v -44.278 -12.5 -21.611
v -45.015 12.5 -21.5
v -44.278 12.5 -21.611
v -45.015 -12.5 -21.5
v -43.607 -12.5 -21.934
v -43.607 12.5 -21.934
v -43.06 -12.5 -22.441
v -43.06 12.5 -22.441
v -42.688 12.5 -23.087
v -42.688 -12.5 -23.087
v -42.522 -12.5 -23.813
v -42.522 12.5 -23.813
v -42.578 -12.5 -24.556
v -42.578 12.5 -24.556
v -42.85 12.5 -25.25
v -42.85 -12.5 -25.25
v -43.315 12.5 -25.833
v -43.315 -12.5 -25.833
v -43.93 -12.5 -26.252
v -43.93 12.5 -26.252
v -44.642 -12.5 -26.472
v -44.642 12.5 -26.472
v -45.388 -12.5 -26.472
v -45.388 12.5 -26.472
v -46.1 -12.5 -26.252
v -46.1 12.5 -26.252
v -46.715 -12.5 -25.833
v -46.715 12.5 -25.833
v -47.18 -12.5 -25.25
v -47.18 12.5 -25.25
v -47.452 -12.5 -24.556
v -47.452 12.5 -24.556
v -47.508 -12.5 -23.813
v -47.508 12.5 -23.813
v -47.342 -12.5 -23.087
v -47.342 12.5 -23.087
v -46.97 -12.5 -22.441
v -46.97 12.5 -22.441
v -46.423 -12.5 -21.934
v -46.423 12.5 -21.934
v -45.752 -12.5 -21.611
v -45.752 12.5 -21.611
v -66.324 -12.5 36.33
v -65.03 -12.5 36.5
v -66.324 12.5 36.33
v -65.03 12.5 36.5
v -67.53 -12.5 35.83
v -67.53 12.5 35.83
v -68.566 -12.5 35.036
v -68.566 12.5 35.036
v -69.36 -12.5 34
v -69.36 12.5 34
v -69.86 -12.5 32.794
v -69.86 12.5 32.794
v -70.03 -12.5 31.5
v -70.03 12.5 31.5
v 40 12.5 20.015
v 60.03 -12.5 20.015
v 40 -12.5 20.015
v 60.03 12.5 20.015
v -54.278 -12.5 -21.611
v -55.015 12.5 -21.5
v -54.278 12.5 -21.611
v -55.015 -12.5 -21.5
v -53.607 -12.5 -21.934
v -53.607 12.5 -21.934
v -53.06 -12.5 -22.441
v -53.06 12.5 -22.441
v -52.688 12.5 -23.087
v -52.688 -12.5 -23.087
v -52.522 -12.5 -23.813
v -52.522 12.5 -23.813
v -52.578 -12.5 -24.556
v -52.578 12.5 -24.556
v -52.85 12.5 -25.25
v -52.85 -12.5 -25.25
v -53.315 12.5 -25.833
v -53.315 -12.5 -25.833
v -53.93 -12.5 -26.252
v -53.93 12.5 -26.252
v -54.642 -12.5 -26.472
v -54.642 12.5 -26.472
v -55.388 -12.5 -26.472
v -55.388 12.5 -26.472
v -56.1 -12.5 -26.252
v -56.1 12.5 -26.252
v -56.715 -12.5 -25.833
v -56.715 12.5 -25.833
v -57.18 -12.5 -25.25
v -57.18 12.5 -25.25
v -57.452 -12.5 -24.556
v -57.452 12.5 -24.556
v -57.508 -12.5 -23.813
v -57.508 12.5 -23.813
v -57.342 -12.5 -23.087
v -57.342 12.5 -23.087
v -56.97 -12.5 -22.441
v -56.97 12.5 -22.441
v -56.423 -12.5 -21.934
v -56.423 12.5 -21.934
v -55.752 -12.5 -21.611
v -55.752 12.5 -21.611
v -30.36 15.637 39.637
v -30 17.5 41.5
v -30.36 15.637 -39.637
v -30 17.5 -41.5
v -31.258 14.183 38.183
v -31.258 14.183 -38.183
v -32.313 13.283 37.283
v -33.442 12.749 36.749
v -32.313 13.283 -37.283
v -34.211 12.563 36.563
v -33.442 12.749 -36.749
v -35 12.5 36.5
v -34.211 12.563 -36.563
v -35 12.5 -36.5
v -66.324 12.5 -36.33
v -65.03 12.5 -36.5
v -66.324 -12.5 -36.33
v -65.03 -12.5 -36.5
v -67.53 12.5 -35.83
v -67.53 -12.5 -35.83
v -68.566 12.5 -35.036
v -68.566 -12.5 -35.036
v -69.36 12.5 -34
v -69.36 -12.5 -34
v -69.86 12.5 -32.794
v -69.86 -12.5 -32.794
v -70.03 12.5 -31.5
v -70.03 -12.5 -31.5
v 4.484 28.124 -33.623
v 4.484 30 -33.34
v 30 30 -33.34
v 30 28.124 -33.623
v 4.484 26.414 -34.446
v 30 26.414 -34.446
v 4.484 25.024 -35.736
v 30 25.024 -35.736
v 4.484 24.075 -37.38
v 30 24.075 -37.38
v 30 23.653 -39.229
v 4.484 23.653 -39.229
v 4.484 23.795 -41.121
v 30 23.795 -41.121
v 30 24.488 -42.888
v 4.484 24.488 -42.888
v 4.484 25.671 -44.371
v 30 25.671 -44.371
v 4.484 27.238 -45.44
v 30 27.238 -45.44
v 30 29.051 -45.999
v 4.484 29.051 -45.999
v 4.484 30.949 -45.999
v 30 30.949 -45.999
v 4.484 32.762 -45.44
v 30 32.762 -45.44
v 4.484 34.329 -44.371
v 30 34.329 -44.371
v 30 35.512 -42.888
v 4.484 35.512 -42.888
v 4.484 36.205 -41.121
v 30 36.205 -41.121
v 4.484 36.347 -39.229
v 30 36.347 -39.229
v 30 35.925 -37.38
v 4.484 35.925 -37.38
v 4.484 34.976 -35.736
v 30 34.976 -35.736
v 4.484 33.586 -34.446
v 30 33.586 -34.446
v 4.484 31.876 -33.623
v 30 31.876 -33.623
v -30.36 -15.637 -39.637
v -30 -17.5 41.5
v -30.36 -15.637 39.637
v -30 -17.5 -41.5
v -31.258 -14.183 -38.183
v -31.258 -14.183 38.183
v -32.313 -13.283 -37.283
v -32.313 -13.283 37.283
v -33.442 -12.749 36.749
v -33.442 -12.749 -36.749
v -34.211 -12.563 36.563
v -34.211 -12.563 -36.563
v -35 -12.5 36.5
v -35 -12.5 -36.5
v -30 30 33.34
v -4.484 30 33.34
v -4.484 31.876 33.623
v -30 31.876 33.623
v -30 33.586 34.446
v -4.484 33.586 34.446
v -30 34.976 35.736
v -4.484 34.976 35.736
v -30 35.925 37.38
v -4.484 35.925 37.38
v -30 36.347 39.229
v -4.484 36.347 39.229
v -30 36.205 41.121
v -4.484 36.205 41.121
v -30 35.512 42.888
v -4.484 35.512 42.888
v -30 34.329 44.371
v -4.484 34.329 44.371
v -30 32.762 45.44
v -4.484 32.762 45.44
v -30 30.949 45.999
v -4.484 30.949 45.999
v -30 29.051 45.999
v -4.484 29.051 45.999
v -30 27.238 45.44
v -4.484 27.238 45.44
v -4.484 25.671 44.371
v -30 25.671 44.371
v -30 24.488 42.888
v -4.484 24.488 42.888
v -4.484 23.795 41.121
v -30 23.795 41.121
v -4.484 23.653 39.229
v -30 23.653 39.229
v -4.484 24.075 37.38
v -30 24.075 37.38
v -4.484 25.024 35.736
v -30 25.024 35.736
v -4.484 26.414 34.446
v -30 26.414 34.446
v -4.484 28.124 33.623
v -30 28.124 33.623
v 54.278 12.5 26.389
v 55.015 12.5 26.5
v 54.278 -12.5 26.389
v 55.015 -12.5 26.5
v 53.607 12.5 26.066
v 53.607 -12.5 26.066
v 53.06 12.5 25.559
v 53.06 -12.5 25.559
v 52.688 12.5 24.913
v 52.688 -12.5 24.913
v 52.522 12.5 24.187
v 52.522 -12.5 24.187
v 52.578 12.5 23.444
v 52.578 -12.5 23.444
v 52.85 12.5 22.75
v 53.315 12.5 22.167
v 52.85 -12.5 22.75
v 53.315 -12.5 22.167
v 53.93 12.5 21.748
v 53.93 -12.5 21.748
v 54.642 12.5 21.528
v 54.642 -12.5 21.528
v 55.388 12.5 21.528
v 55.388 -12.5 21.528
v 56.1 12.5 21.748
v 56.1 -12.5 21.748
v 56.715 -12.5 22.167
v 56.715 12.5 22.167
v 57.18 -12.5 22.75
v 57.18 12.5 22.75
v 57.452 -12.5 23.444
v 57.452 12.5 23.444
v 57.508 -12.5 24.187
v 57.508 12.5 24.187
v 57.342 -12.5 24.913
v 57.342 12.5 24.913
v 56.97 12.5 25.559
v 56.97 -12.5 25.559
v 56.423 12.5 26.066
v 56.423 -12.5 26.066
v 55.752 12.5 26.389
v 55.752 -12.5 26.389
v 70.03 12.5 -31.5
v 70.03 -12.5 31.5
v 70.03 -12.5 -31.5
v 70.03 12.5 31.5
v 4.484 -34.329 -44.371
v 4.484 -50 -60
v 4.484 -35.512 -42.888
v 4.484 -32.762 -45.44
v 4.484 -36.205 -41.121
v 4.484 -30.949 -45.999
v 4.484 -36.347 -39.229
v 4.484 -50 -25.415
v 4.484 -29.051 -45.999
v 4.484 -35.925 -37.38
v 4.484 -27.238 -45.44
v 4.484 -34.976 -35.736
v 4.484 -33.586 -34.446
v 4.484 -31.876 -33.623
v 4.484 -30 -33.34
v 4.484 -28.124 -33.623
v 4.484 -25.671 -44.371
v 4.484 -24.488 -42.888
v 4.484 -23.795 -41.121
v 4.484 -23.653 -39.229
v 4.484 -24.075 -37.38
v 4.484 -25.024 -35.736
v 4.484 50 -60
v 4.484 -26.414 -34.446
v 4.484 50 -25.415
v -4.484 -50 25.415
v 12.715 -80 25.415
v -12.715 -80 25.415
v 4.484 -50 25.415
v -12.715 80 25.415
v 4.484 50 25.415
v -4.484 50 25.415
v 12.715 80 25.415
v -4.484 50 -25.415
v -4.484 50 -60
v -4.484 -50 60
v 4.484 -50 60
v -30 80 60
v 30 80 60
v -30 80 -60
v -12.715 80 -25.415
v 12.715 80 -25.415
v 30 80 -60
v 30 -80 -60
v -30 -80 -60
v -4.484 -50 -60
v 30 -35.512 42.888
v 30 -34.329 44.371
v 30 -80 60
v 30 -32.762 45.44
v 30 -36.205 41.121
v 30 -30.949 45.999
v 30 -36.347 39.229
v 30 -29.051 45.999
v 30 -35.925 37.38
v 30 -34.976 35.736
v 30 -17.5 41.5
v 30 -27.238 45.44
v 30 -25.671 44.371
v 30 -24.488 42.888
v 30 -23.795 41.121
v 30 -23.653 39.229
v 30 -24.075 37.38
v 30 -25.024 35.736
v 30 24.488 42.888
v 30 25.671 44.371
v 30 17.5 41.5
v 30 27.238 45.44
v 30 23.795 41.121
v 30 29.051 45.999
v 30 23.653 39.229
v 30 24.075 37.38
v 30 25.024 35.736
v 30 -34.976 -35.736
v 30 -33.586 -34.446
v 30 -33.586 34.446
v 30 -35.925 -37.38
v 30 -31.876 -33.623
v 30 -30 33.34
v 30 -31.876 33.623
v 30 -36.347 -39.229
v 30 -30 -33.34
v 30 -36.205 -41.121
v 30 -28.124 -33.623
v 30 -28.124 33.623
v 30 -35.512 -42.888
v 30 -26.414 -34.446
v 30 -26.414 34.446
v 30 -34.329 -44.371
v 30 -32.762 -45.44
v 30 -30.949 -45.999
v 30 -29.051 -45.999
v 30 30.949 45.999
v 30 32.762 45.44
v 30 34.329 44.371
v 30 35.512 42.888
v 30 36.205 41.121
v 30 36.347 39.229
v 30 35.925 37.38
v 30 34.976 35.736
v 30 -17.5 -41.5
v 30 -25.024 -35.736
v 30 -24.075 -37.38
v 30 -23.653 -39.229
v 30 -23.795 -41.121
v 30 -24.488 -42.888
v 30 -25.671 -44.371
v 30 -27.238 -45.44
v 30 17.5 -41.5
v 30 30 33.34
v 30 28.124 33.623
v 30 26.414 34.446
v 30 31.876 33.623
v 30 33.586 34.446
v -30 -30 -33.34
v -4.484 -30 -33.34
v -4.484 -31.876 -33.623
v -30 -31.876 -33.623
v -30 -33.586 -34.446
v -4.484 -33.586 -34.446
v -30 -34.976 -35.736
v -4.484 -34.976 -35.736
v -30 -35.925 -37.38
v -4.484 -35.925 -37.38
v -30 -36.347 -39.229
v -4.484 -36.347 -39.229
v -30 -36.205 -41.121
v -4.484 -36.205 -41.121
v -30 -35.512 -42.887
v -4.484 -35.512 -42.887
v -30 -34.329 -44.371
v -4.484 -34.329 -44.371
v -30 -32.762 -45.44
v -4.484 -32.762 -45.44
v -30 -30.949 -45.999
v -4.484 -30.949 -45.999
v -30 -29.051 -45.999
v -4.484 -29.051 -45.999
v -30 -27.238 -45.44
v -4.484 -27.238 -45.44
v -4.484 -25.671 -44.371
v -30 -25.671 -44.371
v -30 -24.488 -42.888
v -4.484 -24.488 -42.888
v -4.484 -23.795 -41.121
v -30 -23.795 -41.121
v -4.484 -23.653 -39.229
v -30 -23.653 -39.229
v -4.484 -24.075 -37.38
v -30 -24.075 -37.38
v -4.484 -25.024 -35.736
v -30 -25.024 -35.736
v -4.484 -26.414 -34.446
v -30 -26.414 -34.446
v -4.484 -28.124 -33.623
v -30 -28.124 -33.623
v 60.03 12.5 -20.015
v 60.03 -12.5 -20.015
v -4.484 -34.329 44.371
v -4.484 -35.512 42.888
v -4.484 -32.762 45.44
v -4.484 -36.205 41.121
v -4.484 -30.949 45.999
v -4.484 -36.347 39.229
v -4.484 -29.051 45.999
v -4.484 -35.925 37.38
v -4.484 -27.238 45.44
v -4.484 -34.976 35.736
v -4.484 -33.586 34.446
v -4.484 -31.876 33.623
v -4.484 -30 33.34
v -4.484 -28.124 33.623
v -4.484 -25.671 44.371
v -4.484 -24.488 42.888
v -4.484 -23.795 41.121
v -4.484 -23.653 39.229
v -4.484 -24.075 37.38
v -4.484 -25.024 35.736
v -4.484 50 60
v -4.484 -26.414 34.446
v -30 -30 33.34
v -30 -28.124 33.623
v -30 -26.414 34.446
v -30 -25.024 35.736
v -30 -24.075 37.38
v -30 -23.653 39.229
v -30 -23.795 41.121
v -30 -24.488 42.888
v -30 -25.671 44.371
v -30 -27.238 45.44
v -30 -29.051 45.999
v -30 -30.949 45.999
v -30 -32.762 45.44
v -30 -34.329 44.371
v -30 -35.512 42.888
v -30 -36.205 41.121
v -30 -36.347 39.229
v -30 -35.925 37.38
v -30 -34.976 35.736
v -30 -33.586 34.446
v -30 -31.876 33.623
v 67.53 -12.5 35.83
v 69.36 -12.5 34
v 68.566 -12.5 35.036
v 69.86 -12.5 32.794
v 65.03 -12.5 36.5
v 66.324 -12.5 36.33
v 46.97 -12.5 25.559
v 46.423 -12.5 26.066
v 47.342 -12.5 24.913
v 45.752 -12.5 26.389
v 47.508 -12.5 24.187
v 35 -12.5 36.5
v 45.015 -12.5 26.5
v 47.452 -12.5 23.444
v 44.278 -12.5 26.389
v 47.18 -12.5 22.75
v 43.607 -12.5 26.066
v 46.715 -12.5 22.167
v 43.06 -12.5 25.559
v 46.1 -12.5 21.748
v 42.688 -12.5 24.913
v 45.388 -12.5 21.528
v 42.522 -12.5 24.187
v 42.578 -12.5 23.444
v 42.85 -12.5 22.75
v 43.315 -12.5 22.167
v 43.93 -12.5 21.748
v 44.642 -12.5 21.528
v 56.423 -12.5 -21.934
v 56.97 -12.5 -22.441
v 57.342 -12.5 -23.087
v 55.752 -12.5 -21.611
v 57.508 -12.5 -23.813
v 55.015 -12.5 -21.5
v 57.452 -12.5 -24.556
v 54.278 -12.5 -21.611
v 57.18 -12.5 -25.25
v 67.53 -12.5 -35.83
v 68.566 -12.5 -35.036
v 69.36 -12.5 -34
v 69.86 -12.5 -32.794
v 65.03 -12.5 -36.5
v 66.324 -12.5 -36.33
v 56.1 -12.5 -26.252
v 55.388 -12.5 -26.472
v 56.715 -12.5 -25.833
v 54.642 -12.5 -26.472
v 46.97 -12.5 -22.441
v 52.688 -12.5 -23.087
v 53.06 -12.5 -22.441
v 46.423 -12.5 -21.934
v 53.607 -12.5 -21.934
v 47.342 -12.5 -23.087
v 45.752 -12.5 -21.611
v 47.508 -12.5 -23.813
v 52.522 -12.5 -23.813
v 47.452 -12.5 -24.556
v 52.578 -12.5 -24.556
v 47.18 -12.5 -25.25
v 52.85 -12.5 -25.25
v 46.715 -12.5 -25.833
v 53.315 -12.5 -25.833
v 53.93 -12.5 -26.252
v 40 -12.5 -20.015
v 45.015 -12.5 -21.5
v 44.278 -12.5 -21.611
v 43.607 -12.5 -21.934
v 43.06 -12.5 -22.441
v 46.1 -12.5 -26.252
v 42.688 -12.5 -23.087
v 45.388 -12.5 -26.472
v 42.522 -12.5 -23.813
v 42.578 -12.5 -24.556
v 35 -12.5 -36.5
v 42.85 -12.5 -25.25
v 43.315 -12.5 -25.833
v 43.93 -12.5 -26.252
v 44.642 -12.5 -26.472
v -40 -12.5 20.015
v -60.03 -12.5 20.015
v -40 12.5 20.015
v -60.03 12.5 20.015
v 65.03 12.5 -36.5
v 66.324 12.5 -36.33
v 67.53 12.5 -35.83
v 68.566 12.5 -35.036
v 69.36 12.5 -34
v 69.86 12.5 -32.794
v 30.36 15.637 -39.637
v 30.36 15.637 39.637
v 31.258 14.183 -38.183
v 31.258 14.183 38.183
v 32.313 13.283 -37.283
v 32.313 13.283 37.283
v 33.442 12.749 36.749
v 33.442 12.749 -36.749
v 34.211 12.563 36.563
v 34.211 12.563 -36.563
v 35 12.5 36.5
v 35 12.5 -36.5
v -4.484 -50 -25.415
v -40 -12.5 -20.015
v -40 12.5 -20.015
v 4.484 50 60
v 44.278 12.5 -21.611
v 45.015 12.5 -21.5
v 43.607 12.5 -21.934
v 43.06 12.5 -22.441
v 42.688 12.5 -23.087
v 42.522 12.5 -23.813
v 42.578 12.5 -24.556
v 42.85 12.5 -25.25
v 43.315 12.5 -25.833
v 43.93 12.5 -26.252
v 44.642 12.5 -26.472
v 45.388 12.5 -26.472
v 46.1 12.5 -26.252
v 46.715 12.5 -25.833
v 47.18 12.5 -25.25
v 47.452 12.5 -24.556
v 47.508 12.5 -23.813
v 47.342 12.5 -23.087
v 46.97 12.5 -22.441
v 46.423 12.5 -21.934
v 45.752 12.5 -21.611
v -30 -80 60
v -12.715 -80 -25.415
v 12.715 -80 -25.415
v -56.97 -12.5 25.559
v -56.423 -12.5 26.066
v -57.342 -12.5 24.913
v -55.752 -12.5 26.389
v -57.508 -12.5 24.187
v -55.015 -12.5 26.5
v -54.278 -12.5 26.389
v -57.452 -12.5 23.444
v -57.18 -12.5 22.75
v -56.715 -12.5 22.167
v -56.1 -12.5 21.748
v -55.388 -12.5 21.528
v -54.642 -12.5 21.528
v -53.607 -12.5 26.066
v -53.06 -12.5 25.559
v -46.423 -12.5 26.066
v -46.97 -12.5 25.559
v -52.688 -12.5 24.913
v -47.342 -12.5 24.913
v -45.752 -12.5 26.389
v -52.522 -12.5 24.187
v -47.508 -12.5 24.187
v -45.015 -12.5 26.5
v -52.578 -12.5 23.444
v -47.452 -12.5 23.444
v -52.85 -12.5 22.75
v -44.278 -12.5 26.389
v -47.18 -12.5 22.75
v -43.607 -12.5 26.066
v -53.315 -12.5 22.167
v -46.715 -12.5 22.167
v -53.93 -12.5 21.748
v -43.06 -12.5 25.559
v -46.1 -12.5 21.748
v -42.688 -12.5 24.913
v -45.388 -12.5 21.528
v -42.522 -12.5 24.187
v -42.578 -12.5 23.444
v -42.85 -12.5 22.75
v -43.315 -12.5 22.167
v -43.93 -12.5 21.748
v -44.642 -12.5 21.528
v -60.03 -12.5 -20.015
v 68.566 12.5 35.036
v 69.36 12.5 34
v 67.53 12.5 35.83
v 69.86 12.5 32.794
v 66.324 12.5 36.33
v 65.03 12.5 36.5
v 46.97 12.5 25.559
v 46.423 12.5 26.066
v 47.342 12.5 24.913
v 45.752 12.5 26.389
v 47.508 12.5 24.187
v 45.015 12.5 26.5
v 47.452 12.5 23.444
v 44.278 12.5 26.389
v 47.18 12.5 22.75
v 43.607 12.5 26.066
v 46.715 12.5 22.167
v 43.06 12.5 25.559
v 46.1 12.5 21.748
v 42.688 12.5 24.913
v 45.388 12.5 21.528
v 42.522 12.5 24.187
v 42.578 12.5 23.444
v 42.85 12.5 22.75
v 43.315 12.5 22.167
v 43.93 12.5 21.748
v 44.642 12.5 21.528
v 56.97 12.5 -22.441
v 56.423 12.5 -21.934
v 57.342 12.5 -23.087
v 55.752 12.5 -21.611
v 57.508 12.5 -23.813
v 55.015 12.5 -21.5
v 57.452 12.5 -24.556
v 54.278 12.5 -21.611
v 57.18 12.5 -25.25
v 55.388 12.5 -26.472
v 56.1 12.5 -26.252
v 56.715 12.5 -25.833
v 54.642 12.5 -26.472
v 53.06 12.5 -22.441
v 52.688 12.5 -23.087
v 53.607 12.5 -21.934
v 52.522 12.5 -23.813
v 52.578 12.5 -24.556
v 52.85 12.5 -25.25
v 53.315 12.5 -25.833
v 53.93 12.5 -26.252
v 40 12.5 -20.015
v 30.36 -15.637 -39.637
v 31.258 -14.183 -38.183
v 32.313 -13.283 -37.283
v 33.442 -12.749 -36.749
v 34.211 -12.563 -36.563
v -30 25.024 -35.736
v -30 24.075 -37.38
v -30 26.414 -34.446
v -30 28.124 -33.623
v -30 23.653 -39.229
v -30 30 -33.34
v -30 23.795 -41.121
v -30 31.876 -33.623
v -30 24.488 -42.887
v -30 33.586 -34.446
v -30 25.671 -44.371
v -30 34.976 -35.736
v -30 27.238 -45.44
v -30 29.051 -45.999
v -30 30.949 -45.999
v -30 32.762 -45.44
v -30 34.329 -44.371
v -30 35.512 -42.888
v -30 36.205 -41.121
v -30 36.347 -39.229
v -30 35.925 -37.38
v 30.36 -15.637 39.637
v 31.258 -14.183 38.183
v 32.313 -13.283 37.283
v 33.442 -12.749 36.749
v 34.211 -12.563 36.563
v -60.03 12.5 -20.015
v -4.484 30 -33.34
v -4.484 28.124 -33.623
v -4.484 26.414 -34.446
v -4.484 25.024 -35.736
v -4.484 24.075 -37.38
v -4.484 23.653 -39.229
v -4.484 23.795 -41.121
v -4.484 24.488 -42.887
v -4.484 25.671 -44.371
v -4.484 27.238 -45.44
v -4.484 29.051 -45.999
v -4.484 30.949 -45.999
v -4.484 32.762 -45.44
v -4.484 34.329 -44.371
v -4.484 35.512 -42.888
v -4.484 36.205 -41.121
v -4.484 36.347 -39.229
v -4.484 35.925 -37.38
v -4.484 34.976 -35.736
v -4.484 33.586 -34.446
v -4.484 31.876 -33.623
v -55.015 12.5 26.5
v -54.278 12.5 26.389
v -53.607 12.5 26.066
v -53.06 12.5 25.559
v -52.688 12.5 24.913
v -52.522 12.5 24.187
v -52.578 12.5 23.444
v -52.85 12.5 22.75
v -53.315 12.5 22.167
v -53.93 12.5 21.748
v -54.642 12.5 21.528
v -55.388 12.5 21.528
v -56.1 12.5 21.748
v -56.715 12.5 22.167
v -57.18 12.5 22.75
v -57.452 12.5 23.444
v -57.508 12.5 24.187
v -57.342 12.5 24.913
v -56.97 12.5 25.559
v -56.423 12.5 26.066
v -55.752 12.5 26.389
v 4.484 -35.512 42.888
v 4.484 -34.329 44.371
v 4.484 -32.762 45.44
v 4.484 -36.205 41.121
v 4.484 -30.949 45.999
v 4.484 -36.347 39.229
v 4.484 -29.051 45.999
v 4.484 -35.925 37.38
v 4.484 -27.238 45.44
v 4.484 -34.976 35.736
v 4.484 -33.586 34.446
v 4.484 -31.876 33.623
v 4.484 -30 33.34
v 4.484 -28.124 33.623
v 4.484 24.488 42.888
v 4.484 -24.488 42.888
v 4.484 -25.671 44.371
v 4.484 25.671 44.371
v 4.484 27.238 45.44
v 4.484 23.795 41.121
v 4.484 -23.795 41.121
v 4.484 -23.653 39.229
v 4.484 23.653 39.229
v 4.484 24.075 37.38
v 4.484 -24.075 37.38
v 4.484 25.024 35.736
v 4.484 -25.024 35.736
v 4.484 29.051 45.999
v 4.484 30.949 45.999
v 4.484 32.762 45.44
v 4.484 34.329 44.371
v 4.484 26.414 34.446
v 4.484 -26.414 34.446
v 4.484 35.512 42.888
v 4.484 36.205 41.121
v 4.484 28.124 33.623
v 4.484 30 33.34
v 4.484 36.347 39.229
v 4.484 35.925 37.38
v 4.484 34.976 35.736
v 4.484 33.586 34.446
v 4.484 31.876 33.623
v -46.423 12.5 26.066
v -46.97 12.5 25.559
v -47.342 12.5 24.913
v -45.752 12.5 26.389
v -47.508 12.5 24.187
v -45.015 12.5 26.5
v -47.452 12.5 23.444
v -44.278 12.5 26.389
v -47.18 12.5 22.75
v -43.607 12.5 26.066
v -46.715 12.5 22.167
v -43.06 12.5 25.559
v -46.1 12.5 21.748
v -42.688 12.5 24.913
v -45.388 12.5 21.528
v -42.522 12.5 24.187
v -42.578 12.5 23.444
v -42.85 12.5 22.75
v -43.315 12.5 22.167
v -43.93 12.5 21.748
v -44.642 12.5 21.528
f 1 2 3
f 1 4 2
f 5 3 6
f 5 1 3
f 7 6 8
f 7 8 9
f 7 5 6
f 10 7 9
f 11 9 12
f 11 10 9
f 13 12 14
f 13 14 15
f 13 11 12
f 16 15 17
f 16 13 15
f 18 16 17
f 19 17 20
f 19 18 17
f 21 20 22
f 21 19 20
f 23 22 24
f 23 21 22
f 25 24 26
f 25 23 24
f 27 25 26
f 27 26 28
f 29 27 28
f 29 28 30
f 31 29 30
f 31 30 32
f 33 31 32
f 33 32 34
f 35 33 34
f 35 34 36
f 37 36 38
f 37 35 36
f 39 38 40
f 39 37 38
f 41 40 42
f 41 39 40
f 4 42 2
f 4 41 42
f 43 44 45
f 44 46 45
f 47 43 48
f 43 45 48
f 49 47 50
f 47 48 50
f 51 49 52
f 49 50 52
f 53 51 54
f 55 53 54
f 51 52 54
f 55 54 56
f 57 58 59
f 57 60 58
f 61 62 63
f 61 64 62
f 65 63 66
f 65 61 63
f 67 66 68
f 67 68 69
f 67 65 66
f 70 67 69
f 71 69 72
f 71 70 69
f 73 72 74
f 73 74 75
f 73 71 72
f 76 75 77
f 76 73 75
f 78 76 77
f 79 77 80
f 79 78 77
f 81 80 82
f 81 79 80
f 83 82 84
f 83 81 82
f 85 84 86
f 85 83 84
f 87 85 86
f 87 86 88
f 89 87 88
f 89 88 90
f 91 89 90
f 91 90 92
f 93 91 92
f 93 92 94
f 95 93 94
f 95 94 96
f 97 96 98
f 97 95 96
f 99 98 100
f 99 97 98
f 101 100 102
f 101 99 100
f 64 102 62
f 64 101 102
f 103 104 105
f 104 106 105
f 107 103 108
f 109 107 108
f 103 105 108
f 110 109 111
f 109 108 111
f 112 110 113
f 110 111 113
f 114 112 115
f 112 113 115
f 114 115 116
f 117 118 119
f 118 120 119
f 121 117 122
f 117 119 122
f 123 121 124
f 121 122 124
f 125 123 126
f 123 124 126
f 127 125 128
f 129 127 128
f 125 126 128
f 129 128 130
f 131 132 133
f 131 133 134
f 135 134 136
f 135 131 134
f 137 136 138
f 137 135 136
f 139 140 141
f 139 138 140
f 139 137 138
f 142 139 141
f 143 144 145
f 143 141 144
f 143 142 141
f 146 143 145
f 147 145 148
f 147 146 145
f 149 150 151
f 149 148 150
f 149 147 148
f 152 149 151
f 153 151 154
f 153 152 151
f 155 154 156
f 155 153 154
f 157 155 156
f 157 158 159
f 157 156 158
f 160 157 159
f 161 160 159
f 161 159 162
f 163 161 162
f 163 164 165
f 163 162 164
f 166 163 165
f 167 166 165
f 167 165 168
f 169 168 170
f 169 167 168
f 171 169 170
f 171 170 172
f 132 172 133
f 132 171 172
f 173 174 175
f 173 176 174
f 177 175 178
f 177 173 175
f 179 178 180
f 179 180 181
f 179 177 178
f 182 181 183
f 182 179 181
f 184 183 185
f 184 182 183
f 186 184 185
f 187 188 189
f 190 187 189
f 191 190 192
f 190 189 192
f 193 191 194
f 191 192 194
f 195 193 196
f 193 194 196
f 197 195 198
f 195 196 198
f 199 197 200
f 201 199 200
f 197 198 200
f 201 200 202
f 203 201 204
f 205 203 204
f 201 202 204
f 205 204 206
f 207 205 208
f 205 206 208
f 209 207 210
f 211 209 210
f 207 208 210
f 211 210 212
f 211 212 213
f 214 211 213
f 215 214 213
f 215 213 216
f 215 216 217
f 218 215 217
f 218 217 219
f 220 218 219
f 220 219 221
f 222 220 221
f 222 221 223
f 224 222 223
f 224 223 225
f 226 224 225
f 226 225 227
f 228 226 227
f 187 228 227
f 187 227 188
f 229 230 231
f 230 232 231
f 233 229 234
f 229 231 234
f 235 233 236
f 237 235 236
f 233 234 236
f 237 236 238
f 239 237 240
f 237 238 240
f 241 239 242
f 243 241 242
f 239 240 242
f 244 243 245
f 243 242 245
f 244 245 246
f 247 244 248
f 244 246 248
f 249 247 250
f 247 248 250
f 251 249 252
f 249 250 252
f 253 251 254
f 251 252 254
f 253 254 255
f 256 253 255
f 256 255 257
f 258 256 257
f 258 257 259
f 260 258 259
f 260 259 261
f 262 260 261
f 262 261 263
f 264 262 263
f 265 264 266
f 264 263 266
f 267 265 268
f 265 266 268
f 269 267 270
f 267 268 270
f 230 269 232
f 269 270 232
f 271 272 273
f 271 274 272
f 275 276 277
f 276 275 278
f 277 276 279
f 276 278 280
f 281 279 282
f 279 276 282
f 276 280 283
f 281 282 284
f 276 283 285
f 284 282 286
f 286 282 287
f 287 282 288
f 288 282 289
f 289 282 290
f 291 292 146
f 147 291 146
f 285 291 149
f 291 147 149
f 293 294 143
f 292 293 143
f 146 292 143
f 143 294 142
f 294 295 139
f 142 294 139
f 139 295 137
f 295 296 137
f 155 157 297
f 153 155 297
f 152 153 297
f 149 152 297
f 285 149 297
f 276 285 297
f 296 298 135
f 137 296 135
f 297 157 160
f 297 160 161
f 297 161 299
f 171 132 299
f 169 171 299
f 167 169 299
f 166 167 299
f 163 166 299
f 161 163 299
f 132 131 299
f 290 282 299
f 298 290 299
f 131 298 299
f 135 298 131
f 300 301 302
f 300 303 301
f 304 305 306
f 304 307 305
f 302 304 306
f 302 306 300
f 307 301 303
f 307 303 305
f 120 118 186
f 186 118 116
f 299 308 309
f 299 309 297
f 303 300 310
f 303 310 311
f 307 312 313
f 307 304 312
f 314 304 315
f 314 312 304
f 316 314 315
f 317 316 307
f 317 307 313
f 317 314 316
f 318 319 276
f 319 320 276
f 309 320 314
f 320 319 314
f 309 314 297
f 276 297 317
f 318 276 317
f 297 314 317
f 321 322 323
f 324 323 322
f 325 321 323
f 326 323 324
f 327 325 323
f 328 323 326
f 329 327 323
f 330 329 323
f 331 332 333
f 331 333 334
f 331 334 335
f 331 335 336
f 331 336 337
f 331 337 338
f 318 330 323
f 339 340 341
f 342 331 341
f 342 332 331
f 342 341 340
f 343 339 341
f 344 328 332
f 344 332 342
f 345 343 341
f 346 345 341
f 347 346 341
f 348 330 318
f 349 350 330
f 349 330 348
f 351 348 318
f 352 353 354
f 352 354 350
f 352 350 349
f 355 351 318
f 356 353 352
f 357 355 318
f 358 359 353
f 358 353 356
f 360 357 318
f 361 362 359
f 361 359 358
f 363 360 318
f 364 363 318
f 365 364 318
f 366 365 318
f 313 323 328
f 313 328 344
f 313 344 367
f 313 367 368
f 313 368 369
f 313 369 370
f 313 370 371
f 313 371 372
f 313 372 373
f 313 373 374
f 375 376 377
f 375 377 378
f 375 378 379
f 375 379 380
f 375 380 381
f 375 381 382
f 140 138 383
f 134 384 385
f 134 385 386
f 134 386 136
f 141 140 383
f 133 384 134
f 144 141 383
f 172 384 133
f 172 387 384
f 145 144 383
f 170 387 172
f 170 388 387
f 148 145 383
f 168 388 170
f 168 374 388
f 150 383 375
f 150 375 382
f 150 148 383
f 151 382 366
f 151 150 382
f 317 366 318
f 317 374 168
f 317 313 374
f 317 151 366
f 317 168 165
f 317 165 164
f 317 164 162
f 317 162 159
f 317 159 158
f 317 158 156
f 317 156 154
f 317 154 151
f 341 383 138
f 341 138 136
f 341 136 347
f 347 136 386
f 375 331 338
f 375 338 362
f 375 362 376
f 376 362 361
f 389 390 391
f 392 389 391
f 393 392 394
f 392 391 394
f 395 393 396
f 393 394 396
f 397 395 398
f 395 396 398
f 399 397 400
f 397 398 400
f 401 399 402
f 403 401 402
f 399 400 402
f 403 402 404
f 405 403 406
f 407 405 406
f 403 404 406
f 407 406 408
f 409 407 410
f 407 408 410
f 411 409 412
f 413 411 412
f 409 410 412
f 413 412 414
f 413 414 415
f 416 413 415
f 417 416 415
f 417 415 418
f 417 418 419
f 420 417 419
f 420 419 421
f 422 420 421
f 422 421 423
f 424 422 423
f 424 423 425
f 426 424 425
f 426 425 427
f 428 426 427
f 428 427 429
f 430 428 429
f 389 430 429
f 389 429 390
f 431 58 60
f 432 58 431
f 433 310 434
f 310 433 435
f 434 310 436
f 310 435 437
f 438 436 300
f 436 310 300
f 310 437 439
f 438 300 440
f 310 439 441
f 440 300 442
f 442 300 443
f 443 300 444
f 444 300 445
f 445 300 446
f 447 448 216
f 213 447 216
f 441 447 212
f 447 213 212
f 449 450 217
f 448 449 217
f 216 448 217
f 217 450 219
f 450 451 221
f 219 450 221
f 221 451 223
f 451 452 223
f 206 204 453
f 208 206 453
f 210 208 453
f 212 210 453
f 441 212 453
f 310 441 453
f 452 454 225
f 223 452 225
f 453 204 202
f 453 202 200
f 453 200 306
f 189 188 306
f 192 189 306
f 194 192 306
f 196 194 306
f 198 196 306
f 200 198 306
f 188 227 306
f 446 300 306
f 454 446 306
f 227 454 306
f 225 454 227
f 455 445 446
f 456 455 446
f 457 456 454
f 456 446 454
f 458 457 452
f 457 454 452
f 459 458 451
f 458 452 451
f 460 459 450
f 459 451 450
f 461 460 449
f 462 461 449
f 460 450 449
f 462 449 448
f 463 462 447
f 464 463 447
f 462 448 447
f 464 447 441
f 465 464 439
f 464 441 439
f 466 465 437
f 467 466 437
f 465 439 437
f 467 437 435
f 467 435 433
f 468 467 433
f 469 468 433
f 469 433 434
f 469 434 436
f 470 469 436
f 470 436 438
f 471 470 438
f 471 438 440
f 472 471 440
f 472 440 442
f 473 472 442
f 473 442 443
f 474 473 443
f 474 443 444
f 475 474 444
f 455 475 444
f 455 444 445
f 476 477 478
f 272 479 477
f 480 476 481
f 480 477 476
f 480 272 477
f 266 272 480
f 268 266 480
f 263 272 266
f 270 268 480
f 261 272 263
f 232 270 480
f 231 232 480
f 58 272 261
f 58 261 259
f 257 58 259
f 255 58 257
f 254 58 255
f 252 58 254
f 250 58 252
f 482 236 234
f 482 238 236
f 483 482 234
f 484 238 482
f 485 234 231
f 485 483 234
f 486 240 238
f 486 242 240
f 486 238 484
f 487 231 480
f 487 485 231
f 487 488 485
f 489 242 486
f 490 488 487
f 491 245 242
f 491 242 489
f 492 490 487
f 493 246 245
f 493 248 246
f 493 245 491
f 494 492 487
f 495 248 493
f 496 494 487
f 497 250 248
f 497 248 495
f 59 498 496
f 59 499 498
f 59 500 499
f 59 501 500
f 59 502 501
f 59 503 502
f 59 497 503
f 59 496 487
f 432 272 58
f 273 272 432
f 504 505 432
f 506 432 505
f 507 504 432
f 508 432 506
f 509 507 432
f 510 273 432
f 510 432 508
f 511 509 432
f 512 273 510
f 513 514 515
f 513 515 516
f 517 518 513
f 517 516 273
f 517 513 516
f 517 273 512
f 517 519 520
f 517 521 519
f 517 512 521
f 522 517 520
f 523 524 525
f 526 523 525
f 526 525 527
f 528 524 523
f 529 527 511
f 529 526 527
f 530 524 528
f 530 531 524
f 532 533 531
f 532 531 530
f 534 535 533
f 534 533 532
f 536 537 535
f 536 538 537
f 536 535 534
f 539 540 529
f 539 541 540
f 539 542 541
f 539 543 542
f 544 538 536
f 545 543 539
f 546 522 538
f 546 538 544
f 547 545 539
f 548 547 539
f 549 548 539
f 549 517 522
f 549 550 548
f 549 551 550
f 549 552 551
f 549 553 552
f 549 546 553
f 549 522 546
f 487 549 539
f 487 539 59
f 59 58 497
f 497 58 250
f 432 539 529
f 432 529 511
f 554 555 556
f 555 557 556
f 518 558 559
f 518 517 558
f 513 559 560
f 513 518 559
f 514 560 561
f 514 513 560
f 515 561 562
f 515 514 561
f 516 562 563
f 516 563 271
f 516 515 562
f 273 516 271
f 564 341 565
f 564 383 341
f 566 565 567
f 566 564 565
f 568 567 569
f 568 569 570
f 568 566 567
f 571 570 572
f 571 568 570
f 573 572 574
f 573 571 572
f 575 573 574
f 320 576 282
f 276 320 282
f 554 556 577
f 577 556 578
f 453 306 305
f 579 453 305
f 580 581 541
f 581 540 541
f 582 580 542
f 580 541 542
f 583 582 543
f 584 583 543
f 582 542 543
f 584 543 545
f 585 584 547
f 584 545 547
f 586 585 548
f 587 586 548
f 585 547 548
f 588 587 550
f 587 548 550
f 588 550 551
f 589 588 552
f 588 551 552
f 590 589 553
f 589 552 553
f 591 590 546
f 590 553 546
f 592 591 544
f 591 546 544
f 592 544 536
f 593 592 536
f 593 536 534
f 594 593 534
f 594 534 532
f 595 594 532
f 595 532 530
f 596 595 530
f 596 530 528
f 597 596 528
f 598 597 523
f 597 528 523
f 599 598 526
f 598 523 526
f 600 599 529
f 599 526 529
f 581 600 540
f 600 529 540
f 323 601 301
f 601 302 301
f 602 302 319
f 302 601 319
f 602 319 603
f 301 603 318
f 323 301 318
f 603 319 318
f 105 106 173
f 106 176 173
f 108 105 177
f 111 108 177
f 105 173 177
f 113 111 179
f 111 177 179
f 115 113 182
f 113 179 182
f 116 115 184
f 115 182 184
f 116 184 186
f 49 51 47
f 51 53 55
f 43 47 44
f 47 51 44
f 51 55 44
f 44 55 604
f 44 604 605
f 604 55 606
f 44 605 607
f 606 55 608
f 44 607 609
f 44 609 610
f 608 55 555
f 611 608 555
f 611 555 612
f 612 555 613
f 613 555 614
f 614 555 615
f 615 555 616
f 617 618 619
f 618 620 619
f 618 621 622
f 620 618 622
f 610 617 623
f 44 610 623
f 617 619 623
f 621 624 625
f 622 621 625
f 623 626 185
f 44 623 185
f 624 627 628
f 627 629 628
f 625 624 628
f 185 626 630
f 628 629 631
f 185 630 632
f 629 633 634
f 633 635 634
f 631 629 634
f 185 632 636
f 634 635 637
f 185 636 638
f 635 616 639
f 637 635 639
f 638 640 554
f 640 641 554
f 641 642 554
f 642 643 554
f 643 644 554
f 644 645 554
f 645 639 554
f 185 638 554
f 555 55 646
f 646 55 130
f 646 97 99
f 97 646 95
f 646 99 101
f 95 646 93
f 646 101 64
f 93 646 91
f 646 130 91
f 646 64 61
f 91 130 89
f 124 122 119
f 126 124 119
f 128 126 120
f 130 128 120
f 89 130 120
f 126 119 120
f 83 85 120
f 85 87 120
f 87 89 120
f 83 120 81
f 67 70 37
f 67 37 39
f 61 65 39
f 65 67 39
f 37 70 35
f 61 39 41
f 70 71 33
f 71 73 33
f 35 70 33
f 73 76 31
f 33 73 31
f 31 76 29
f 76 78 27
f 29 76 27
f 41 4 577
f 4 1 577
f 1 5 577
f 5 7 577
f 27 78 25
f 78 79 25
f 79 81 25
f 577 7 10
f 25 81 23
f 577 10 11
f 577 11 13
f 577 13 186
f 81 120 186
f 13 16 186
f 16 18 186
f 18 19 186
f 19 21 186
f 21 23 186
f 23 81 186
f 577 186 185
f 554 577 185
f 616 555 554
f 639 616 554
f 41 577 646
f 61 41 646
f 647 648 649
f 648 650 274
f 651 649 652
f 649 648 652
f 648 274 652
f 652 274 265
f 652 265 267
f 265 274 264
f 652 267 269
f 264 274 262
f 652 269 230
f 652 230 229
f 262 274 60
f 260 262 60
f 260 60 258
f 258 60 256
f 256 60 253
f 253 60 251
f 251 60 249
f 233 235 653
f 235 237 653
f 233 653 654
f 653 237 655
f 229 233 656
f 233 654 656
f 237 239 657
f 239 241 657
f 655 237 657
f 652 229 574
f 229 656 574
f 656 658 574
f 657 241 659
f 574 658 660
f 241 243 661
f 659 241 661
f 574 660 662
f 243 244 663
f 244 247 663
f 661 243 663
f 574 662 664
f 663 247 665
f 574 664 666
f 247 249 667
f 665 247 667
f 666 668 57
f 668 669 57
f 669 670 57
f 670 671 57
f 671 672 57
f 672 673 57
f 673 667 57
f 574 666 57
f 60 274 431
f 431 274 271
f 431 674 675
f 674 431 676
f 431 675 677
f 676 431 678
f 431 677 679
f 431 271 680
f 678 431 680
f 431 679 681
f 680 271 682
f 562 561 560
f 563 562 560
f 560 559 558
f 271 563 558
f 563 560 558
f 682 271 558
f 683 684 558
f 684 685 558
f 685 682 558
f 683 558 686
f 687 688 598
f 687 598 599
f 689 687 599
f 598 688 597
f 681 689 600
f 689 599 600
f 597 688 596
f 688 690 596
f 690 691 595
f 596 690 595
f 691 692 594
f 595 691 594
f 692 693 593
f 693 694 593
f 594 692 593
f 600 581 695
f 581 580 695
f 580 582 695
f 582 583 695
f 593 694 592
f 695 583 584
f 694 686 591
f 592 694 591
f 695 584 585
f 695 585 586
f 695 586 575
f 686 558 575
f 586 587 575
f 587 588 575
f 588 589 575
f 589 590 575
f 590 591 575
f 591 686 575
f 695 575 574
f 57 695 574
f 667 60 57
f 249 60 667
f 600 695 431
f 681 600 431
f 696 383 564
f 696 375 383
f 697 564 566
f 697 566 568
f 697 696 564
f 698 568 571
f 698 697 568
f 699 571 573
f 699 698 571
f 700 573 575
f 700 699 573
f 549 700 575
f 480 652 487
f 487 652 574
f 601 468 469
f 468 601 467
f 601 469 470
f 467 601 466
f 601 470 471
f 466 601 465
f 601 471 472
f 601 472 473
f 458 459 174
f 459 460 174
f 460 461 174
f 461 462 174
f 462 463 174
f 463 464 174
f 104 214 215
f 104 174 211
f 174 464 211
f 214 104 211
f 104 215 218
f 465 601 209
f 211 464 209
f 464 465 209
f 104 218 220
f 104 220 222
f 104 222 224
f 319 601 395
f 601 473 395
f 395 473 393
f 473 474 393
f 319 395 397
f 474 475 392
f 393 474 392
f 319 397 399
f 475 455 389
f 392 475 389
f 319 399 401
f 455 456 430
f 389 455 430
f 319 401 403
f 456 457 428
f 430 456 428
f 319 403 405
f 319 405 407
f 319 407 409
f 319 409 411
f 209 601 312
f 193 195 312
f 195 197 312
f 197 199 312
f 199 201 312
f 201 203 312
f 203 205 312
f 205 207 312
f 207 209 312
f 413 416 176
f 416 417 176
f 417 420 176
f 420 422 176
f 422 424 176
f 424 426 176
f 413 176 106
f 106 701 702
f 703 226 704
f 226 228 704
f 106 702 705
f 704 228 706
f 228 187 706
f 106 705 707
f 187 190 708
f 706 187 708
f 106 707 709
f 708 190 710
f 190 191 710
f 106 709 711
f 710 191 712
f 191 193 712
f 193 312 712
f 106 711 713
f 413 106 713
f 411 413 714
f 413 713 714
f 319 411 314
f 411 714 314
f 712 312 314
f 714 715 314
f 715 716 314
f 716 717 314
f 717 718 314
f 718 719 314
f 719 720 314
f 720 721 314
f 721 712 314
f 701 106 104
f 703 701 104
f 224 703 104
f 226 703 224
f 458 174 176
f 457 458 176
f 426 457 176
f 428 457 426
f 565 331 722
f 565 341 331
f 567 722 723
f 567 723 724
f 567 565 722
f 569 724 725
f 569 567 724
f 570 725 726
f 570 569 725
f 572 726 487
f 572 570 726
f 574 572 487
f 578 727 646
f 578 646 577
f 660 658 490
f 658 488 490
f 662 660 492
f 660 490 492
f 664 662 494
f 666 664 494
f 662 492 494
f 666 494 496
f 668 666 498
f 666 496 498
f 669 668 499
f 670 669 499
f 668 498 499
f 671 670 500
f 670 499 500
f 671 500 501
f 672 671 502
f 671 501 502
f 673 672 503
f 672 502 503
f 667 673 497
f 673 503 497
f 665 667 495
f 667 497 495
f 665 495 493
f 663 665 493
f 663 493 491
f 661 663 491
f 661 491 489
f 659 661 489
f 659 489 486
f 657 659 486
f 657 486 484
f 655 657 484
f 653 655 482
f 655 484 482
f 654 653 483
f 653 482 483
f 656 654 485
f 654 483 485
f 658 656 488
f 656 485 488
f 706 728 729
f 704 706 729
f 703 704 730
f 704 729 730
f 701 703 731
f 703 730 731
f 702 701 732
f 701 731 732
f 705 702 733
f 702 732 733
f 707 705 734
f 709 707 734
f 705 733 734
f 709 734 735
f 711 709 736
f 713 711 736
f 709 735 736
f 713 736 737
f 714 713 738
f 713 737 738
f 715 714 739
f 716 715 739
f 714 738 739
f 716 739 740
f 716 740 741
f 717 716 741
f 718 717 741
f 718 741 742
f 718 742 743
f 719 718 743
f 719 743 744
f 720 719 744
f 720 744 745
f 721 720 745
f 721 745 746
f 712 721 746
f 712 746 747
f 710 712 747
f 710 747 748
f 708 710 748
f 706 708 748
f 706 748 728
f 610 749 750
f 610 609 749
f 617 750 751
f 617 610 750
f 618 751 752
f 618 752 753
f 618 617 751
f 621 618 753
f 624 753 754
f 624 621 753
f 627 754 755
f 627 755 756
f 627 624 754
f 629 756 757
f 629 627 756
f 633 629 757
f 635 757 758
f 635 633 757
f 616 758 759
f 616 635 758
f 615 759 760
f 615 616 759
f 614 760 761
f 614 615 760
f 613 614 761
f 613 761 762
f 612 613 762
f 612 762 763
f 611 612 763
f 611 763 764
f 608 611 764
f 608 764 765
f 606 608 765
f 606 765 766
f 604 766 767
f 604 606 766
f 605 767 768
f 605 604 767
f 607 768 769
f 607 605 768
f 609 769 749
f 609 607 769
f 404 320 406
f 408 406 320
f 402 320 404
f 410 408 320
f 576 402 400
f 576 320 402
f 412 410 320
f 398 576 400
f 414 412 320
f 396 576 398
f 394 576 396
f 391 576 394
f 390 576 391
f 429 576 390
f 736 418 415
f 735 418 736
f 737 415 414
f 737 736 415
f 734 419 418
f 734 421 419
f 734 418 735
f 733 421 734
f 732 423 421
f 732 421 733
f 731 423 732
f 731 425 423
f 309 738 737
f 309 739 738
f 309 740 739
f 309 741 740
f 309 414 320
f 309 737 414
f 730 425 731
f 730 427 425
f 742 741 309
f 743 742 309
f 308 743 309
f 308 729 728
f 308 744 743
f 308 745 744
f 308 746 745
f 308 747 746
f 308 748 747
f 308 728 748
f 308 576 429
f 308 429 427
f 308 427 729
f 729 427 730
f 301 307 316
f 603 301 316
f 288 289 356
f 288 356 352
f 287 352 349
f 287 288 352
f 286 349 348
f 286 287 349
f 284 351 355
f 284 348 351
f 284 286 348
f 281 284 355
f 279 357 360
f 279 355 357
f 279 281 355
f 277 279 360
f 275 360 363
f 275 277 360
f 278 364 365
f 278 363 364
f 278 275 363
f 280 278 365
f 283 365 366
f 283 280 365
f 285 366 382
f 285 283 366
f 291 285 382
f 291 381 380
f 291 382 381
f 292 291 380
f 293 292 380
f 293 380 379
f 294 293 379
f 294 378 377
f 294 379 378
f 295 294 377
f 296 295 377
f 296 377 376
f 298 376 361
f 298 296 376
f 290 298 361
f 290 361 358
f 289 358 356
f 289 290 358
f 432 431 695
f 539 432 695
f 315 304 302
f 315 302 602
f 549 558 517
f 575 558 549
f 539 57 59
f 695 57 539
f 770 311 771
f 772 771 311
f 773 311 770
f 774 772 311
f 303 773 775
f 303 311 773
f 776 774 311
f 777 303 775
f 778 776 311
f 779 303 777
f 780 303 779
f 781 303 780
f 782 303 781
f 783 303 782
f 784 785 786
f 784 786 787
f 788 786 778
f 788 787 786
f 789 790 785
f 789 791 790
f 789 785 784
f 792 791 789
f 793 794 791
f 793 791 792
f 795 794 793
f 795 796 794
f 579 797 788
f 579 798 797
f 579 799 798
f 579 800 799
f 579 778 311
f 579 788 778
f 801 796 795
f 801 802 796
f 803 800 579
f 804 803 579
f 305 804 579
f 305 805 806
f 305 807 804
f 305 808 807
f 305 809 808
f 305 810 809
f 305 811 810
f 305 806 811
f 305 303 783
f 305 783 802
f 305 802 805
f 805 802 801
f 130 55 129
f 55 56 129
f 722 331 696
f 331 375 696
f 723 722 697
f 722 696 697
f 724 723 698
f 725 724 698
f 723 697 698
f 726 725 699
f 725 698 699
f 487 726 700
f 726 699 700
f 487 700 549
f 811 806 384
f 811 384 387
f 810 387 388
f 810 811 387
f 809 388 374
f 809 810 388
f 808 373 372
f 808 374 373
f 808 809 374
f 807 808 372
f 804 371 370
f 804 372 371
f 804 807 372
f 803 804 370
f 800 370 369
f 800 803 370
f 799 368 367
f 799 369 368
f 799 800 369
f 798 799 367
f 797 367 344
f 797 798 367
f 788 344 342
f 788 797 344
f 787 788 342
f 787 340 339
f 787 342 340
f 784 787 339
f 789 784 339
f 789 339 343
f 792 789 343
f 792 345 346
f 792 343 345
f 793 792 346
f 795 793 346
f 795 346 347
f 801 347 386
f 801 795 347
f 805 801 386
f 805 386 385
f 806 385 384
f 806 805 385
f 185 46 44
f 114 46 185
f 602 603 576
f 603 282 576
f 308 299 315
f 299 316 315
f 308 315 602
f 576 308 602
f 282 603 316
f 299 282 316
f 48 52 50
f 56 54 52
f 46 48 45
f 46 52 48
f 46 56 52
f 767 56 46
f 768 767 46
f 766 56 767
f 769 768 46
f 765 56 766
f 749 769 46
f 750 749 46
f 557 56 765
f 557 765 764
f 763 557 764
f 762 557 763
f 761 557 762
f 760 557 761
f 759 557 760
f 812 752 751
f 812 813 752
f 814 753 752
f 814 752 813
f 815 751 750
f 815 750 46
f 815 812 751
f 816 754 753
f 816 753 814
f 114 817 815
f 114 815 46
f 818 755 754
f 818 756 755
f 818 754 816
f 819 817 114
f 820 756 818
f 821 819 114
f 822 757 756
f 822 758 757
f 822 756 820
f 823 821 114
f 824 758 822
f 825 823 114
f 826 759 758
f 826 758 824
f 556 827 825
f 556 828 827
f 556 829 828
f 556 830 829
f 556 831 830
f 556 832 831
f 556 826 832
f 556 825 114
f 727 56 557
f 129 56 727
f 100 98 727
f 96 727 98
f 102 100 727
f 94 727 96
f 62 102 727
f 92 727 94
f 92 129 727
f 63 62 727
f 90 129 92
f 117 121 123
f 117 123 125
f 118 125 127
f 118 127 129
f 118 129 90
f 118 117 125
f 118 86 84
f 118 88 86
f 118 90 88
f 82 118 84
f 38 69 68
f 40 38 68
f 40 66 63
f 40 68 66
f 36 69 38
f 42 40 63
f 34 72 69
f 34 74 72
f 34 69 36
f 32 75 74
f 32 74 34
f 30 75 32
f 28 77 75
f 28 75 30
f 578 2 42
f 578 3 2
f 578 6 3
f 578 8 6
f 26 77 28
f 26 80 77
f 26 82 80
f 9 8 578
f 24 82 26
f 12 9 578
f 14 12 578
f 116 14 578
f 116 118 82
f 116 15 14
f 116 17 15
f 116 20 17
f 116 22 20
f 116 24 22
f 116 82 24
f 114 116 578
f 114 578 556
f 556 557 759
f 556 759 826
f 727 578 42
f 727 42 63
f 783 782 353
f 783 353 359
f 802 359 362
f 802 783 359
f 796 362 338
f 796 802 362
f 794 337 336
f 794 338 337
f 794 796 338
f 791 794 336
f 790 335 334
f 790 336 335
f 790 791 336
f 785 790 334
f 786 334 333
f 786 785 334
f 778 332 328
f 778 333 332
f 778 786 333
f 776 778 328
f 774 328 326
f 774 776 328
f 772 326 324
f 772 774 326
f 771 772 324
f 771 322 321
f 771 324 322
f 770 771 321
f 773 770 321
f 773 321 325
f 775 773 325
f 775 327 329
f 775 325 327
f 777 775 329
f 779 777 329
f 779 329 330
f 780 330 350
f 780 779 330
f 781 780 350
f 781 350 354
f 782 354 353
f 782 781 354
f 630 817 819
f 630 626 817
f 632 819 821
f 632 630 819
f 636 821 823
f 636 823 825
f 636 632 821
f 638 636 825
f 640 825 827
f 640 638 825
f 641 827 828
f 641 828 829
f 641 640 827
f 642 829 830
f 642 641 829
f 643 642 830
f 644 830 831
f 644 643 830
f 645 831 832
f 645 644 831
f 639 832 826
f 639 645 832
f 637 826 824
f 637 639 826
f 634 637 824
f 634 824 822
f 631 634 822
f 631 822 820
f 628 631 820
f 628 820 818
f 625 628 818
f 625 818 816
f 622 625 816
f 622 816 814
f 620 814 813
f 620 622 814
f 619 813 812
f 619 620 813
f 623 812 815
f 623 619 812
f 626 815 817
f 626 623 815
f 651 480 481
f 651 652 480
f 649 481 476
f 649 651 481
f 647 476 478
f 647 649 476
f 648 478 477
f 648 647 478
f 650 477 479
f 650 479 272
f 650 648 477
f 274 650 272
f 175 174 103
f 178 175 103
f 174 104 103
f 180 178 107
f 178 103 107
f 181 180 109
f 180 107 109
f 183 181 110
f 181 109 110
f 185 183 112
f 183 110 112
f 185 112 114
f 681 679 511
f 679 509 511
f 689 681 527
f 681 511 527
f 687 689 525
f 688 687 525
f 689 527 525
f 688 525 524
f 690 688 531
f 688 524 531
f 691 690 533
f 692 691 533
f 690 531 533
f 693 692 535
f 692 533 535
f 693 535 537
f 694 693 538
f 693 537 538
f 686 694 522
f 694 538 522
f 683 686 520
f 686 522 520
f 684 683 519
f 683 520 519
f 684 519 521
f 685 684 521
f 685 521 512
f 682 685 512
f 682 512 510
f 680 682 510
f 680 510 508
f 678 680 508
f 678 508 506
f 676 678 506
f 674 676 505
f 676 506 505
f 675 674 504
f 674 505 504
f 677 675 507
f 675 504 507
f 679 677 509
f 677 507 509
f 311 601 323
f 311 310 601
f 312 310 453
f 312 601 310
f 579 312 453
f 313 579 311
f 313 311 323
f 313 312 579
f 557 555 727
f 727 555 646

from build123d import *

# Parameters (mm, degrees)
SKETCH1_W                      = 60
SKETCH1_H                      = 120
BOSS_EXTRUDE1_DEPTH            = 80
CUT_EXTRUDE2_REACH             = 106.403
SKETCH3_W                      = 50.83
SKETCH3_H                      = 25.43
CUT_EXTRUDE2_DIRECTION_2_REACH = 106.403
CUT_EXTRUDE3_REACH             = 106.403
SKETCH5_W                      = 8.9675
SKETCH5_H                      = 100
CUT_EXTRUDE3_DIRECTION_2_REACH = 106.403
CUT_EXTRUDE4_REACH             = 106.403
SKETCH6_R                      = 6.365
CUT_EXTRUDE4_DIRECTION_2_REACH = 106.403
SKETCH7_W                      = 40.03
SKETCH7_H                      = 73
SKETCH7_R                      = 2.5
SKETCH7_W_2                    = 20.03
SKETCH7_H_2                    = 40.03
BOSS_EXTRUDE2_DEPTH            = 12.5
FILLET2_R                      = 5


with BuildPart() as part:
    # Sketch1 → Boss-Extrude1 (new, symmetric)
    with BuildSketch(Plane(origin=(0, 0, 0), x_dir=(1, 0, 0), z_dir=(0, 1, 0))):
        Rectangle(SKETCH1_W, SKETCH1_H)
    extrude(amount=BOSS_EXTRUDE1_DEPTH, both=True)

    # Cut-Extrude2: up to this face of the body (flat: up to its plane)
    cut_extrude2_end = Plane(part.part.faces().sort_by_distance((0, -80, 0))[0])
    # Sketch3 → Cut-Extrude2 (cut, up to the picked face)
    with BuildSketch(Plane(origin=(0, 0, 0), x_dir=(0, 0, -1), z_dir=(0, 1, 0)), mode=Mode.PRIVATE) as cut_extrude2_sk1:
        Rectangle(SKETCH3_W, SKETCH3_H)
    cut_extrude2_tool1 = split(extrude(cut_extrude2_sk1.sketch, amount=-CUT_EXTRUDE2_REACH, mode=Mode.PRIVATE), bisect_by=cut_extrude2_end, keep=Keep.BOTH, mode=Mode.PRIVATE)
    add(cut_extrude2_tool1.solids().sort_by(Axis((0, 0, 0), (0, -1, 0)))[0], mode=Mode.SUBTRACT)

    # Cut-Extrude2 direction 2: up to this face of the body (flat: up to its plane)
    cut_extrude2_direction_2_end = Plane(part.part.faces().sort_by_distance((0, 80, 0))[0])
    # Sketch3 → Cut-Extrude2 direction 2 (cut, up to the picked face)
    with BuildSketch(Plane(origin=(0, 0, 0), x_dir=(0, 0, -1), z_dir=(0, 1, 0)), mode=Mode.PRIVATE) as cut_extrude2_direction_2_sk1:
        Rectangle(SKETCH3_W, SKETCH3_H)
    cut_extrude2_direction_2_tool1 = split(extrude(cut_extrude2_direction_2_sk1.sketch, amount=CUT_EXTRUDE2_DIRECTION_2_REACH, mode=Mode.PRIVATE), bisect_by=cut_extrude2_direction_2_end, keep=Keep.BOTH, mode=Mode.PRIVATE)
    add(cut_extrude2_direction_2_tool1.solids().sort_by(Axis((0, 0, 0), (0, 1, 0)))[0], mode=Mode.SUBTRACT)

    # Cut-Extrude3: up to this face of the body (flat: up to its plane)
    cut_extrude3_end = Plane(part.part.faces().sort_by_distance((0, 0, 60))[0])
    # Sketch5 → Cut-Extrude3 (cut, up to the picked face)
    with BuildSketch(Plane.XY, mode=Mode.PRIVATE) as cut_extrude3_sk1:
        Rectangle(SKETCH5_W, SKETCH5_H)
    cut_extrude3_tool1 = split(extrude(cut_extrude3_sk1.sketch, amount=CUT_EXTRUDE3_REACH, mode=Mode.PRIVATE), bisect_by=cut_extrude3_end, keep=Keep.BOTH, mode=Mode.PRIVATE)
    add(cut_extrude3_tool1.solids().sort_by(Axis((0, 0, 0), (0, 0, 1)))[0], mode=Mode.SUBTRACT)

    # Cut-Extrude3 direction 2: up to this face of the body (flat: up to its plane)
    cut_extrude3_direction_2_end = Plane(part.part.faces().sort_by_distance((0, 0, -60))[0])
    # Sketch5 → Cut-Extrude3 direction 2 (cut, up to the picked face)
    with BuildSketch(Plane.XY, mode=Mode.PRIVATE) as cut_extrude3_direction_2_sk1:
        Rectangle(SKETCH5_W, SKETCH5_H)
    cut_extrude3_direction_2_tool1 = split(extrude(cut_extrude3_direction_2_sk1.sketch, amount=-CUT_EXTRUDE3_DIRECTION_2_REACH, mode=Mode.PRIVATE), bisect_by=cut_extrude3_direction_2_end, keep=Keep.BOTH, mode=Mode.PRIVATE)
    add(cut_extrude3_direction_2_tool1.solids().sort_by(Axis((0, 0, 0), (0, 0, -1)))[0], mode=Mode.SUBTRACT)

    # Cut-Extrude4: up to this face of the body (flat: up to its plane)
    cut_extrude4_end = Plane(part.part.faces().sort_by_distance((30, 0, 0))[0])
    # Sketch6 → Cut-Extrude4 (cut, up to the picked face)
    with BuildSketch(Plane(origin=(0, 0, 0), x_dir=(0, 0, -1), z_dir=(1, 0, 0)), mode=Mode.PRIVATE) as cut_extrude4_sk1:
        with Locations((-39.705, -30)):
            Circle(SKETCH6_R)
    cut_extrude4_tool1 = split(extrude(cut_extrude4_sk1.sketch, amount=CUT_EXTRUDE4_REACH, mode=Mode.PRIVATE), bisect_by=cut_extrude4_end, keep=Keep.BOTH, mode=Mode.PRIVATE)
    # Sketch6 → Cut-Extrude4 (cut, up to the picked face)
    with BuildSketch(Plane(origin=(0, 0, 0), x_dir=(0, 0, -1), z_dir=(1, 0, 0)), mode=Mode.PRIVATE) as cut_extrude4_sk2:
        with Locations((-39.705, 30)):
            Circle(SKETCH6_R)
    cut_extrude4_tool2 = split(extrude(cut_extrude4_sk2.sketch, amount=CUT_EXTRUDE4_REACH, mode=Mode.PRIVATE), bisect_by=cut_extrude4_end, keep=Keep.BOTH, mode=Mode.PRIVATE)
    # Sketch6 → Cut-Extrude4 (cut, up to the picked face)
    with BuildSketch(Plane(origin=(0, 0, 0), x_dir=(0, 0, -1), z_dir=(1, 0, 0)), mode=Mode.PRIVATE) as cut_extrude4_sk3:
        with Locations(Location((39.705, -30, 0), (0, 0, 180))):
            Circle(SKETCH6_R)
    cut_extrude4_tool3 = split(extrude(cut_extrude4_sk3.sketch, amount=CUT_EXTRUDE4_REACH, mode=Mode.PRIVATE), bisect_by=cut_extrude4_end, keep=Keep.BOTH, mode=Mode.PRIVATE)
    # Sketch6 → Cut-Extrude4 (cut, up to the picked face)
    with BuildSketch(Plane(origin=(0, 0, 0), x_dir=(0, 0, -1), z_dir=(1, 0, 0)), mode=Mode.PRIVATE) as cut_extrude4_sk4:
        with Locations(Location((39.705, 30, 0), (0, 0, 180))):
            Circle(SKETCH6_R)
    cut_extrude4_tool4 = split(extrude(cut_extrude4_sk4.sketch, amount=CUT_EXTRUDE4_REACH, mode=Mode.PRIVATE), bisect_by=cut_extrude4_end, keep=Keep.BOTH, mode=Mode.PRIVATE)
    add(cut_extrude4_tool1.solids().sort_by(Axis((0, -30, 39.705), (1, 0, 0)))[0], mode=Mode.SUBTRACT)
    add(cut_extrude4_tool2.solids().sort_by(Axis((0, 30, 39.705), (1, 0, 0)))[0], mode=Mode.SUBTRACT)
    add(cut_extrude4_tool3.solids().sort_by(Axis((0, -30, -39.705), (1, 0, 0)))[0], mode=Mode.SUBTRACT)
    add(cut_extrude4_tool4.solids().sort_by(Axis((0, 30, -39.705), (1, 0, 0)))[0], mode=Mode.SUBTRACT)

    # Cut-Extrude4 direction 2: up to this face of the body (flat: up to its plane)
    cut_extrude4_direction_2_end = Plane(part.part.faces().sort_by_distance((-30, 0, 0))[0])
    # Sketch6 → Cut-Extrude4 direction 2 (cut, up to the picked face)
    with BuildSketch(Plane(origin=(0, 0, 0), x_dir=(0, 0, -1), z_dir=(1, 0, 0)), mode=Mode.PRIVATE) as cut_extrude4_direction_2_sk1:
        with Locations((-39.705, -30)):
            Circle(SKETCH6_R)
    cut_extrude4_direction_2_tool1 = split(extrude(cut_extrude4_direction_2_sk1.sketch, amount=-CUT_EXTRUDE4_DIRECTION_2_REACH, mode=Mode.PRIVATE), bisect_by=cut_extrude4_direction_2_end, keep=Keep.BOTH, mode=Mode.PRIVATE)
    # Sketch6 → Cut-Extrude4 direction 2 (cut, up to the picked face)
    with BuildSketch(Plane(origin=(0, 0, 0), x_dir=(0, 0, -1), z_dir=(1, 0, 0)), mode=Mode.PRIVATE) as cut_extrude4_direction_2_sk2:
        with Locations((-39.705, 30)):
            Circle(SKETCH6_R)
    cut_extrude4_direction_2_tool2 = split(extrude(cut_extrude4_direction_2_sk2.sketch, amount=-CUT_EXTRUDE4_DIRECTION_2_REACH, mode=Mode.PRIVATE), bisect_by=cut_extrude4_direction_2_end, keep=Keep.BOTH, mode=Mode.PRIVATE)
    # Sketch6 → Cut-Extrude4 direction 2 (cut, up to the picked face)
    with BuildSketch(Plane(origin=(0, 0, 0), x_dir=(0, 0, -1), z_dir=(1, 0, 0)), mode=Mode.PRIVATE) as cut_extrude4_direction_2_sk3:
        with Locations(Location((39.705, -30, 0), (0, 0, 180))):
            Circle(SKETCH6_R)
    cut_extrude4_direction_2_tool3 = split(extrude(cut_extrude4_direction_2_sk3.sketch, amount=-CUT_EXTRUDE4_DIRECTION_2_REACH, mode=Mode.PRIVATE), bisect_by=cut_extrude4_direction_2_end, keep=Keep.BOTH, mode=Mode.PRIVATE)
    # Sketch6 → Cut-Extrude4 direction 2 (cut, up to the picked face)
    with BuildSketch(Plane(origin=(0, 0, 0), x_dir=(0, 0, -1), z_dir=(1, 0, 0)), mode=Mode.PRIVATE) as cut_extrude4_direction_2_sk4:
        with Locations(Location((39.705, 30, 0), (0, 0, 180))):
            Circle(SKETCH6_R)
    cut_extrude4_direction_2_tool4 = split(extrude(cut_extrude4_direction_2_sk4.sketch, amount=-CUT_EXTRUDE4_DIRECTION_2_REACH, mode=Mode.PRIVATE), bisect_by=cut_extrude4_direction_2_end, keep=Keep.BOTH, mode=Mode.PRIVATE)
    add(cut_extrude4_direction_2_tool1.solids().sort_by(Axis((0, -30, 39.705), (-1, 0, 0)))[0], mode=Mode.SUBTRACT)
    add(cut_extrude4_direction_2_tool2.solids().sort_by(Axis((0, 30, 39.705), (-1, 0, 0)))[0], mode=Mode.SUBTRACT)
    add(cut_extrude4_direction_2_tool3.solids().sort_by(Axis((0, -30, -39.705), (-1, 0, 0)))[0], mode=Mode.SUBTRACT)
    add(cut_extrude4_direction_2_tool4.solids().sort_by(Axis((0, 30, -39.705), (-1, 0, 0)))[0], mode=Mode.SUBTRACT)

    # Sketch7 → Boss-Extrude2 (add, symmetric)
    with BuildSketch(Plane(origin=(0, 0, 0), x_dir=(1, 0, 0), z_dir=(0, 1, 0))):
        with Locations((-50.015, 0)):
            Rectangle(SKETCH7_W, SKETCH7_H)
        with Locations(Location((-55.015, 24, 0), (0, 0, 270))):
            Circle(SKETCH7_R, mode=Mode.SUBTRACT)
        with Locations(Location((-45.015, 24, 0), (0, 0, 270))):
            Circle(SKETCH7_R, mode=Mode.SUBTRACT)
        with Locations(Location((-55.015, -24, 0), (0, 0, 270))):
            Circle(SKETCH7_R, mode=Mode.SUBTRACT)
        with Locations(Location((-45.015, -24, 0), (0, 0, 270))):
            Circle(SKETCH7_R, mode=Mode.SUBTRACT)
        with Locations((-50.015, 0)):
            Rectangle(SKETCH7_W_2, SKETCH7_H_2, mode=Mode.SUBTRACT)
    boss_extrude2 = extrude(amount=BOSS_EXTRUDE2_DEPTH, both=True)

    # Mirror2: Boss-Extrude2 across plane
    add(boss_extrude2.mirror(Plane(origin=(0, 0, 0), x_dir=(0, 0, 1), z_dir=(1, 0, 0))))

    # Fillet2
    fillet2_edges = [part.edges().sort_by_distance(p)[0] for p in [
        (-30, 12.5, 0),
        (-30, -12.5, 0),
        (-30, 0, 36.5),
        (-30, 0, -36.5),
        (-70.03, 0, -36.5),
        (-70.03, 0, 36.5),
        (30, 12.5, 0),
        (30, 0, -36.5),
        (30, 0, 36.5),
        (70.03, 0, 36.5),
        (70.03, 0, -36.5),
        (30, -12.5, 0),
    ]]
    fillet(fillet2_edges, radius=FILLET2_R)


solid = part.part
